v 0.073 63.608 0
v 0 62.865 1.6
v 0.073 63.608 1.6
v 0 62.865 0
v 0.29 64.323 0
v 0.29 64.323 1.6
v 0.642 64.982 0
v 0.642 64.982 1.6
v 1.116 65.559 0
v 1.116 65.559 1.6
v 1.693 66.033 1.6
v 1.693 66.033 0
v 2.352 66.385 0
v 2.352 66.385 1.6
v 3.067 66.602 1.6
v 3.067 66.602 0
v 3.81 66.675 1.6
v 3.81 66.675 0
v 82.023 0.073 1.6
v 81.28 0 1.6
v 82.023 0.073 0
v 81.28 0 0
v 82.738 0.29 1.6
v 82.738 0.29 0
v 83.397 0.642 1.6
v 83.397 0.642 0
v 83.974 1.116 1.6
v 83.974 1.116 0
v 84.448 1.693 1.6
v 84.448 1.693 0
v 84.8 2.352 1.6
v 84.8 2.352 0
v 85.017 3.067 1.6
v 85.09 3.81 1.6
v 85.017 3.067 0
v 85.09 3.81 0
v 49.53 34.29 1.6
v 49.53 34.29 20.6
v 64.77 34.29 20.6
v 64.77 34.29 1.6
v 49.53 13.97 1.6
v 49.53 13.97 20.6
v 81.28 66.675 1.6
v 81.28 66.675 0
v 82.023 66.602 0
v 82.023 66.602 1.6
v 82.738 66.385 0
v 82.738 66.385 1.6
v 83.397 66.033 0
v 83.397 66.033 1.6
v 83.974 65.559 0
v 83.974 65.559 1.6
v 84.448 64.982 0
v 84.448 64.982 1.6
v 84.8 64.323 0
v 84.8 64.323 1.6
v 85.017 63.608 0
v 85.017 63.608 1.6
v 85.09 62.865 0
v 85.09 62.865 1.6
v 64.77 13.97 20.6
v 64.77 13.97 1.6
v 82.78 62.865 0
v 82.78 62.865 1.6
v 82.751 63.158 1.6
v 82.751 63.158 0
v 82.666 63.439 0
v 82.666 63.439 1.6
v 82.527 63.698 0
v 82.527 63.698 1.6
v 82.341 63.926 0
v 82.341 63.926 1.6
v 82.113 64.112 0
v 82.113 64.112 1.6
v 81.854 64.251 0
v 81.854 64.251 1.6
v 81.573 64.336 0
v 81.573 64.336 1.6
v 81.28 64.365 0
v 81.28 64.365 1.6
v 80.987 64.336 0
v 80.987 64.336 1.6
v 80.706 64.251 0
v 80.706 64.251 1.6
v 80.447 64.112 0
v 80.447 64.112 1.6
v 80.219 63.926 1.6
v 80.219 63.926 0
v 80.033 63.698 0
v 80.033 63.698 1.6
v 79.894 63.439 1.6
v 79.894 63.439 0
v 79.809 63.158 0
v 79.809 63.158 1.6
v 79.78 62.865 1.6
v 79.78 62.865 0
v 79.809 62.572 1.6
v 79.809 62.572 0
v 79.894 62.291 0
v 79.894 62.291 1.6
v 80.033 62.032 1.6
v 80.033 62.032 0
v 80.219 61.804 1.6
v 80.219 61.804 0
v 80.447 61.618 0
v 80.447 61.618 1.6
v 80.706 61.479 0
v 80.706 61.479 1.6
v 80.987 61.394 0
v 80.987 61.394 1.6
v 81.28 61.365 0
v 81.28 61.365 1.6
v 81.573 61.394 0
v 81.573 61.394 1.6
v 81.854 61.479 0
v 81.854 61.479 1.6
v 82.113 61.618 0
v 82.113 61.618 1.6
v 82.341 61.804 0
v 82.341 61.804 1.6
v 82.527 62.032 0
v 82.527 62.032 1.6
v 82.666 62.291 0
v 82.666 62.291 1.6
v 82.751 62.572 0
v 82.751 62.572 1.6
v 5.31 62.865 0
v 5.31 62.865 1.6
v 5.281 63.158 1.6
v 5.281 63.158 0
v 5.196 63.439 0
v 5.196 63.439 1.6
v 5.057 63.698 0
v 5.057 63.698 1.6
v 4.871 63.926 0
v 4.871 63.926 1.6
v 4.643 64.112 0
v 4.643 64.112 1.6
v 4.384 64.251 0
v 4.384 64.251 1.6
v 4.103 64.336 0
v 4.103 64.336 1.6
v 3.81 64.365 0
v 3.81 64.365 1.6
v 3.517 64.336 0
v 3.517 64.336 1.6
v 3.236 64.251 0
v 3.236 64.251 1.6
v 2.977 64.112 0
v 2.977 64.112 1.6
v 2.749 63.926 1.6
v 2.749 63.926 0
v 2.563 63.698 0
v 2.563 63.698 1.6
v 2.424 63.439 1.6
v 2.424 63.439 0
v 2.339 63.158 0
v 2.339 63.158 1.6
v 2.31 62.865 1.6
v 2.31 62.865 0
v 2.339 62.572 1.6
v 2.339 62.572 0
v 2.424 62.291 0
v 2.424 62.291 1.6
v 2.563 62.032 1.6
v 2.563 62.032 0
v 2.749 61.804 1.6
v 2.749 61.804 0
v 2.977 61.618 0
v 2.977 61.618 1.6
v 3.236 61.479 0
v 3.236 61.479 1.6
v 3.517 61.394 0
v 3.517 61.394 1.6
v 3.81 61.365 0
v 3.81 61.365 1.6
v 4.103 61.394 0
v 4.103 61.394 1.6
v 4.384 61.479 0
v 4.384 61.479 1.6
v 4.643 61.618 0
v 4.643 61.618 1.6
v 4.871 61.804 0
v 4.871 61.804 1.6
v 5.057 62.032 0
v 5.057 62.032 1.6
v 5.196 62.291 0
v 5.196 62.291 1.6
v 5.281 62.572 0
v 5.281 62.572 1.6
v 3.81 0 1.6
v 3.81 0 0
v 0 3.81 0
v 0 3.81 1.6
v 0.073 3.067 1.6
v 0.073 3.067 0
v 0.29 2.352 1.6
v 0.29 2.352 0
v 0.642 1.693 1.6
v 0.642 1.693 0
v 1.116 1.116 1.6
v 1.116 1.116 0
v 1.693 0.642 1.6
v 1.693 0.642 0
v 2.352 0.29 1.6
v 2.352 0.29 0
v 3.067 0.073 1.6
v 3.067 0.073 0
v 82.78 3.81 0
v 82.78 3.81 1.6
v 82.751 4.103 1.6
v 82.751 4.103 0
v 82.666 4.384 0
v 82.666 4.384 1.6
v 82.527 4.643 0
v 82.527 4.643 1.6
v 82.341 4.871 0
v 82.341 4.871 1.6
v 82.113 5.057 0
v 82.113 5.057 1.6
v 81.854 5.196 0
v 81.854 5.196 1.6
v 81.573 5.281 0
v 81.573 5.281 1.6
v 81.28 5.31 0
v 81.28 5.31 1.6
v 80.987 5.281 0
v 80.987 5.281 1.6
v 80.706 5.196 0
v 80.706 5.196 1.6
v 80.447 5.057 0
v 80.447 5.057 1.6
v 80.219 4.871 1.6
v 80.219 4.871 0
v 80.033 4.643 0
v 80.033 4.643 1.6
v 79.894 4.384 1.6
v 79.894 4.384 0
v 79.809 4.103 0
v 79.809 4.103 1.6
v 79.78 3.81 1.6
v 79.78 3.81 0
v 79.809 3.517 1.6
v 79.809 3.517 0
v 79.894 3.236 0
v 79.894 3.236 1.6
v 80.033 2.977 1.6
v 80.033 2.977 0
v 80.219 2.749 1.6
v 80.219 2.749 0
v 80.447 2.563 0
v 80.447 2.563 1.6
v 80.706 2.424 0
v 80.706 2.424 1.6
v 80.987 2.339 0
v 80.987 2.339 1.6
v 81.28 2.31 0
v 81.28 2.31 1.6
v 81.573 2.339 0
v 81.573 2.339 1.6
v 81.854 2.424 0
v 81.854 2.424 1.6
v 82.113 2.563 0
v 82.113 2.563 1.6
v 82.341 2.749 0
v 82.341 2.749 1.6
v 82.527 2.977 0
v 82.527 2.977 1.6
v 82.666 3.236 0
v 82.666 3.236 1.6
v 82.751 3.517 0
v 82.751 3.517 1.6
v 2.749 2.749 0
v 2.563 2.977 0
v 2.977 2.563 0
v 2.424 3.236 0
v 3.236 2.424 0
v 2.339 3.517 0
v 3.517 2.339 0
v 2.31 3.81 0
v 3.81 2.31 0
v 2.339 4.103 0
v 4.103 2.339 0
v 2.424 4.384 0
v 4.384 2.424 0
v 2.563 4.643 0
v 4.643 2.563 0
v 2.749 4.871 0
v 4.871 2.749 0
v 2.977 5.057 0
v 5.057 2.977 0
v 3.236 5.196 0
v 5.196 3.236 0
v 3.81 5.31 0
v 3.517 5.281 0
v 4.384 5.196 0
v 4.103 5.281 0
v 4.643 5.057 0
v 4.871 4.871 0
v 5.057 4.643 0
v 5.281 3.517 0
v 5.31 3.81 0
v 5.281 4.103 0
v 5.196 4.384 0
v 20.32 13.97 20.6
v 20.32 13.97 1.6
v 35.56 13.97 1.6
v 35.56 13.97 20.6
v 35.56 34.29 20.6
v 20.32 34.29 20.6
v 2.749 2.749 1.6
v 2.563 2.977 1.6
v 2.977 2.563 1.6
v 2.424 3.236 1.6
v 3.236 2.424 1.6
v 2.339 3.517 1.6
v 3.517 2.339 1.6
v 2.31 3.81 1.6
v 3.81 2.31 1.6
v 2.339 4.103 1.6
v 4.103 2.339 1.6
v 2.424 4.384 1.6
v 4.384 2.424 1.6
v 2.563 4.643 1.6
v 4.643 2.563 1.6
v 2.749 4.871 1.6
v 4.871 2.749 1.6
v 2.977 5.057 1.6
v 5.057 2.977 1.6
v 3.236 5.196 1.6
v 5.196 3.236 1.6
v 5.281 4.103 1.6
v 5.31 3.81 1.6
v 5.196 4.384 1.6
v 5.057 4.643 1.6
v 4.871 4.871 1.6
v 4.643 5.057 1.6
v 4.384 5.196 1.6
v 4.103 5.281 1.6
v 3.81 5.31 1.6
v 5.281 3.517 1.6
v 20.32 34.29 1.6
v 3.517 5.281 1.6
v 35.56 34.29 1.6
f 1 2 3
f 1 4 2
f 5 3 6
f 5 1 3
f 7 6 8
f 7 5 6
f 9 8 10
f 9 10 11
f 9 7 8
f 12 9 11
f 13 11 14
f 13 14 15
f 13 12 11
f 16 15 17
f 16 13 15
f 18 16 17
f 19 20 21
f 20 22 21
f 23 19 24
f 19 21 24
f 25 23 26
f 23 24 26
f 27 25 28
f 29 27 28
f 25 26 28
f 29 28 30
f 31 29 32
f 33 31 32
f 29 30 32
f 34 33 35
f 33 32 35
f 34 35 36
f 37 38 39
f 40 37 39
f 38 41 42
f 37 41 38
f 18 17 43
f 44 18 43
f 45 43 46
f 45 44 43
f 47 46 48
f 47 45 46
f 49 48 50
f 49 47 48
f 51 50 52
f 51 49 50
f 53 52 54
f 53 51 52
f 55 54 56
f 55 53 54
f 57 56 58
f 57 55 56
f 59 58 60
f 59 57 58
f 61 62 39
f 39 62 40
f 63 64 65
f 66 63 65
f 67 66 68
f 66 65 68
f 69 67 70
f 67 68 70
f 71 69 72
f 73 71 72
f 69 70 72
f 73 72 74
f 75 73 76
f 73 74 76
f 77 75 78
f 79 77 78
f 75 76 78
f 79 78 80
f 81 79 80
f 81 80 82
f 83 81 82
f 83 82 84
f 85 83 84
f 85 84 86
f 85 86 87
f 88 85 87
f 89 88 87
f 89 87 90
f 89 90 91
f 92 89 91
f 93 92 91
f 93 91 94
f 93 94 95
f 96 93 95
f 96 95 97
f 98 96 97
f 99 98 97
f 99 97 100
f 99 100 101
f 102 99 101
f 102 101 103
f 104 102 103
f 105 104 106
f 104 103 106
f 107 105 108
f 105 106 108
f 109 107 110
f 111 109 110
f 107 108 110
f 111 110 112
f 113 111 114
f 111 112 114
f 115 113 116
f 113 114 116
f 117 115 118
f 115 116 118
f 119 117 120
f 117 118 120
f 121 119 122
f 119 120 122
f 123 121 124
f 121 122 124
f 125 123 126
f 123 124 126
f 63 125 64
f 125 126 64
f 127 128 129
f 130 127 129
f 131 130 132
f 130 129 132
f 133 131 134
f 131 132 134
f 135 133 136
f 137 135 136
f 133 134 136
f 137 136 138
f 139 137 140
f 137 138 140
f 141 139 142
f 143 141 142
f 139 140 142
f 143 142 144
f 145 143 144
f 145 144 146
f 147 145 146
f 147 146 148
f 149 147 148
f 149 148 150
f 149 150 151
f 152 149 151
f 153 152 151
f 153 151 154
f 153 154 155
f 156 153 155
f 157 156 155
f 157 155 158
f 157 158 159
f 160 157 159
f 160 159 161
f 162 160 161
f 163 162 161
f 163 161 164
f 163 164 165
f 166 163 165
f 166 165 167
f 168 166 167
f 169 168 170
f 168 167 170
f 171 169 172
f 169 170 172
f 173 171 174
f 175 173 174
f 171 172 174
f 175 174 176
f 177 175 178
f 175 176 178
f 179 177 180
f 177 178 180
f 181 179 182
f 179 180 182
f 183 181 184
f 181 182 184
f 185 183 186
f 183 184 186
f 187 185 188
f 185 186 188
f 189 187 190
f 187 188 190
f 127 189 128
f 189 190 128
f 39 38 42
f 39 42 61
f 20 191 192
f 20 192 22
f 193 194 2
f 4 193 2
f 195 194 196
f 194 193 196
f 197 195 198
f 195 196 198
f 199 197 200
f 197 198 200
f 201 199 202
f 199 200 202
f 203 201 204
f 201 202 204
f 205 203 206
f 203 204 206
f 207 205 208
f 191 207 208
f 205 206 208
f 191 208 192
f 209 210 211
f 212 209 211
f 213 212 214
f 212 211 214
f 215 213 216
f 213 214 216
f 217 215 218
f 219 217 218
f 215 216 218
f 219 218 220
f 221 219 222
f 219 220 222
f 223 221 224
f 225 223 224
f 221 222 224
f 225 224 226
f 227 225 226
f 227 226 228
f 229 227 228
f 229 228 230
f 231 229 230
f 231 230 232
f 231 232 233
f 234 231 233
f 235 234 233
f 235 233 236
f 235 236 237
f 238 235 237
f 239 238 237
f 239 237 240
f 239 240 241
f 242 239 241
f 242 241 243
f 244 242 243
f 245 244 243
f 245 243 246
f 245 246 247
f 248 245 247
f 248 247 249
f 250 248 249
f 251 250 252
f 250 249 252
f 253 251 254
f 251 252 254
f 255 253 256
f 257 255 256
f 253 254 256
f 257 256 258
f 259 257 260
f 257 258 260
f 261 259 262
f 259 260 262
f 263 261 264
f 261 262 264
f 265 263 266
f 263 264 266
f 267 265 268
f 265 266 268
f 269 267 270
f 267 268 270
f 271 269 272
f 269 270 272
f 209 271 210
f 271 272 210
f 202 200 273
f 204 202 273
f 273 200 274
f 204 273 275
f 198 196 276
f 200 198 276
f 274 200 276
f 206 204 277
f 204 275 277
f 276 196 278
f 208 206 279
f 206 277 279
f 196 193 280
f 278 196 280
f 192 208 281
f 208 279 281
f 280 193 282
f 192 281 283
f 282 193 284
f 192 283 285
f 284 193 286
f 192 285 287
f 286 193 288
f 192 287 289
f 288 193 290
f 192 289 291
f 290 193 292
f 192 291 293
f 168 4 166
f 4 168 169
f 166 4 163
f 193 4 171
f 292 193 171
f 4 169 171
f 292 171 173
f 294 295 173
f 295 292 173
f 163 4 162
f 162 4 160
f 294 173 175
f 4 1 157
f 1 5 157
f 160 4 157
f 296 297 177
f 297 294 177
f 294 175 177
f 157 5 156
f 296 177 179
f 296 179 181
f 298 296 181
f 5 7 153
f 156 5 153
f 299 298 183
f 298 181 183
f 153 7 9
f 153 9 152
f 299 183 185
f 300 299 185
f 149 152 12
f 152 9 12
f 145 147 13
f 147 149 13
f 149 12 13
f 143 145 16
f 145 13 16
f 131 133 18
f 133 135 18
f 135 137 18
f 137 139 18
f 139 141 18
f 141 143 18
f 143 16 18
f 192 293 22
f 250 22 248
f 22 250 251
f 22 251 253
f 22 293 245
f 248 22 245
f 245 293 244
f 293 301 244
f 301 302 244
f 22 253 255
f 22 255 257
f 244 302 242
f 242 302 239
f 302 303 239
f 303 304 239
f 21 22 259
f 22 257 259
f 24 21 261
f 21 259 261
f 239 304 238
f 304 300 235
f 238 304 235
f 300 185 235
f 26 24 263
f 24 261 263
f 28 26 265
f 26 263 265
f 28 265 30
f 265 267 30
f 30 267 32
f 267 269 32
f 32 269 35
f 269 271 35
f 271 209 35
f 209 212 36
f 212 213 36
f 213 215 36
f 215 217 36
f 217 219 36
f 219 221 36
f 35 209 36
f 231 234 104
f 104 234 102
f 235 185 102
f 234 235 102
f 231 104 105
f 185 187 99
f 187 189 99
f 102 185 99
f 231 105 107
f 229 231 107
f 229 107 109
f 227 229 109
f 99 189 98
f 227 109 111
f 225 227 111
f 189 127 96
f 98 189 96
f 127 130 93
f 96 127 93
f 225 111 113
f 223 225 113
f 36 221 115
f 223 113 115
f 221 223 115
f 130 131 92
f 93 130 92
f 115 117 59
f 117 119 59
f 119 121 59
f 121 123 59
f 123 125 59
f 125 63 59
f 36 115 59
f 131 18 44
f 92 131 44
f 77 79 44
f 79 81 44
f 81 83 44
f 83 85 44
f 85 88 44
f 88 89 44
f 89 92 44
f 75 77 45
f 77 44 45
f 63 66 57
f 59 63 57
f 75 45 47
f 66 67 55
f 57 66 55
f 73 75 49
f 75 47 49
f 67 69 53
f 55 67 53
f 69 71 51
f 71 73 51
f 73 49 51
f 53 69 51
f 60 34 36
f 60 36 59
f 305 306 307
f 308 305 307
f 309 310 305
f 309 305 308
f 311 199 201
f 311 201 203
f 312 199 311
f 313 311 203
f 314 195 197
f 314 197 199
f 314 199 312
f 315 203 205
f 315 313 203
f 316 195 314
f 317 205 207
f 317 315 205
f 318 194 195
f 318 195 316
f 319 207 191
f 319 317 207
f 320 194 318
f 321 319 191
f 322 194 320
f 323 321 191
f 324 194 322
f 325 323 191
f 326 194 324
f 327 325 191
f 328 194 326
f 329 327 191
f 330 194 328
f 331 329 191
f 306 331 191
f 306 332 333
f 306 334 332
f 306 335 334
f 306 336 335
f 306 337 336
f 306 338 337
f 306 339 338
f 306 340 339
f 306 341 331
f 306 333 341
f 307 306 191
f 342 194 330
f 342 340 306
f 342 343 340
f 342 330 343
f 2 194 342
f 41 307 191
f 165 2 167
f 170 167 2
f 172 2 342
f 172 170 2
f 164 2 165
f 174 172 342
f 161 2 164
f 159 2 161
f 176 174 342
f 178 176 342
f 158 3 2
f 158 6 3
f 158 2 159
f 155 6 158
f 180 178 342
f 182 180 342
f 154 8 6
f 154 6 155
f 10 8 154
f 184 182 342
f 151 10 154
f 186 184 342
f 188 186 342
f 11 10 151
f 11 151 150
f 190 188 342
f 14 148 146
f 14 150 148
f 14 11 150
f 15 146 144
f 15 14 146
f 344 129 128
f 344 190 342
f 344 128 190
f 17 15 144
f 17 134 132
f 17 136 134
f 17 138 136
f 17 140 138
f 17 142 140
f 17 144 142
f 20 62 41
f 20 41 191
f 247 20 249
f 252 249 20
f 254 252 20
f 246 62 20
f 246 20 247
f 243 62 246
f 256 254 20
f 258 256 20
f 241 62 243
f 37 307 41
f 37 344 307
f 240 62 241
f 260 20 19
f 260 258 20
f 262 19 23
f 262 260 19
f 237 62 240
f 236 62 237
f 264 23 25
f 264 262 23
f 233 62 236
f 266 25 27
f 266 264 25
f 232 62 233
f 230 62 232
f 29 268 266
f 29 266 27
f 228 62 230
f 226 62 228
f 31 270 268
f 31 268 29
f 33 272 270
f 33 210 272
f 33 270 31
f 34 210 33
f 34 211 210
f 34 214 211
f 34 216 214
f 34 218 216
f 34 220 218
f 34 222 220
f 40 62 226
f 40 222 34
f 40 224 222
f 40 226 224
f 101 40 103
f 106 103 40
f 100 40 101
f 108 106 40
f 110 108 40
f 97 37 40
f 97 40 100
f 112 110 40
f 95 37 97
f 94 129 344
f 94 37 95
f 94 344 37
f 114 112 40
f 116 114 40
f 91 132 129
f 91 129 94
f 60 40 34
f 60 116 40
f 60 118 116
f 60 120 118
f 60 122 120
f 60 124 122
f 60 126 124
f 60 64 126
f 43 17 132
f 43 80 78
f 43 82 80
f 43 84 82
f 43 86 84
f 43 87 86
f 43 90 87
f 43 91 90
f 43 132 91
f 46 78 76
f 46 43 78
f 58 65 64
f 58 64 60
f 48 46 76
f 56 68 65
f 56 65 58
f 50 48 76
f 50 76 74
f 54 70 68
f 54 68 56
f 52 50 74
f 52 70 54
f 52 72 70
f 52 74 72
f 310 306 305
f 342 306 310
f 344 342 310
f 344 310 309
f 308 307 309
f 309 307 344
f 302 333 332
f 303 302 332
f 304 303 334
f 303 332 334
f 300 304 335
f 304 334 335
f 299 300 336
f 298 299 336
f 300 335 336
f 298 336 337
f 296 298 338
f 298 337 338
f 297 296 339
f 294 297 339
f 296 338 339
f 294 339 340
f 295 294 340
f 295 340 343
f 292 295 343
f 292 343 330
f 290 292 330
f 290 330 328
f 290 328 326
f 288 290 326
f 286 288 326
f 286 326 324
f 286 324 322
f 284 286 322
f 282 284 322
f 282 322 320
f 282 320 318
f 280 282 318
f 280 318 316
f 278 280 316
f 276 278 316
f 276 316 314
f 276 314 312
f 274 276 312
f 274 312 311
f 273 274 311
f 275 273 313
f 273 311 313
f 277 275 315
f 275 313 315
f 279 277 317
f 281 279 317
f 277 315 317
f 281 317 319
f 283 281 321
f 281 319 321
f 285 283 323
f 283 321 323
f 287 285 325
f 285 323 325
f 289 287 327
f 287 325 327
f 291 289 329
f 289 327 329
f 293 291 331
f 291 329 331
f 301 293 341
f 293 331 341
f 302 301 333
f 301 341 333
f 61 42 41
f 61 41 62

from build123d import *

# Parameters (mm, degrees)
SKETCH_1_W                = 85.09
SKETCH_1_H                = 66.675
EXTRUDE_1_DEPTH           = 1.6
SKETCH_2_W                = 15.24
SKETCH_2_H                = 20.32
EXTRUDE_2_DEPTH           = 19
SKETCH_3_W                = 15.24
SKETCH_3_H                = 20.32
EXTRUDE_3_DEPTH           = 19
HOLE_WIZARD_3_0_3_1_D     = 3
HOLE_WIZARD_3_0_3_1_DEPTH = 20.6
FILLET_1_R                = 3.81


with BuildPart() as part:
    # 草图1 → 凸台-拉伸1 (new body)
    with BuildSketch(Plane.XY.offset(1.6)):
        with Locations((42.545, 33.3375)):
            Rectangle(SKETCH_1_W, SKETCH_1_H)
    extrude(amount=-EXTRUDE_1_DEPTH)

    # 草图2 → 凸台-拉伸2 (add)
    with BuildSketch(Plane.XY.offset(1.6)):
        with Locations((57.15, 24.13)):
            Rectangle(SKETCH_2_W, SKETCH_2_H)
    extrude(amount=EXTRUDE_2_DEPTH)

    # 草图3 → 凸台-拉伸3 (add)
    with BuildSketch(Plane.XY.offset(1.6)):
        with Locations((27.94, 24.13)):
            Rectangle(SKETCH_3_W, SKETCH_3_H)
    extrude(amount=EXTRUDE_3_DEPTH)

    # Ø3.0 (3) 直径孔1
    with Locations(Plane(origin=(0, 0, 0), x_dir=(-1, 0, 0), z_dir=(0, 0, -1))):
        with Locations((-3.81, 62.865), (-3.81, 3.81), (-81.28, 3.81), (-81.28, 62.865)):
            Hole(HOLE_WIZARD_3_0_3_1_D / 2, depth=HOLE_WIZARD_3_0_3_1_DEPTH)

    # 圆角1
    fillet_1_edges = [part.edges().sort_by_distance(p)[0] for p in [
        (0, 0, 0.8),
        (0, 66.675, 0.8),
        (85.09, 66.675, 0.8),
        (85.09, 0, 0.8),
    ]]
    fillet(fillet_1_edges, radius=FILLET_1_R)


solid = part.part
